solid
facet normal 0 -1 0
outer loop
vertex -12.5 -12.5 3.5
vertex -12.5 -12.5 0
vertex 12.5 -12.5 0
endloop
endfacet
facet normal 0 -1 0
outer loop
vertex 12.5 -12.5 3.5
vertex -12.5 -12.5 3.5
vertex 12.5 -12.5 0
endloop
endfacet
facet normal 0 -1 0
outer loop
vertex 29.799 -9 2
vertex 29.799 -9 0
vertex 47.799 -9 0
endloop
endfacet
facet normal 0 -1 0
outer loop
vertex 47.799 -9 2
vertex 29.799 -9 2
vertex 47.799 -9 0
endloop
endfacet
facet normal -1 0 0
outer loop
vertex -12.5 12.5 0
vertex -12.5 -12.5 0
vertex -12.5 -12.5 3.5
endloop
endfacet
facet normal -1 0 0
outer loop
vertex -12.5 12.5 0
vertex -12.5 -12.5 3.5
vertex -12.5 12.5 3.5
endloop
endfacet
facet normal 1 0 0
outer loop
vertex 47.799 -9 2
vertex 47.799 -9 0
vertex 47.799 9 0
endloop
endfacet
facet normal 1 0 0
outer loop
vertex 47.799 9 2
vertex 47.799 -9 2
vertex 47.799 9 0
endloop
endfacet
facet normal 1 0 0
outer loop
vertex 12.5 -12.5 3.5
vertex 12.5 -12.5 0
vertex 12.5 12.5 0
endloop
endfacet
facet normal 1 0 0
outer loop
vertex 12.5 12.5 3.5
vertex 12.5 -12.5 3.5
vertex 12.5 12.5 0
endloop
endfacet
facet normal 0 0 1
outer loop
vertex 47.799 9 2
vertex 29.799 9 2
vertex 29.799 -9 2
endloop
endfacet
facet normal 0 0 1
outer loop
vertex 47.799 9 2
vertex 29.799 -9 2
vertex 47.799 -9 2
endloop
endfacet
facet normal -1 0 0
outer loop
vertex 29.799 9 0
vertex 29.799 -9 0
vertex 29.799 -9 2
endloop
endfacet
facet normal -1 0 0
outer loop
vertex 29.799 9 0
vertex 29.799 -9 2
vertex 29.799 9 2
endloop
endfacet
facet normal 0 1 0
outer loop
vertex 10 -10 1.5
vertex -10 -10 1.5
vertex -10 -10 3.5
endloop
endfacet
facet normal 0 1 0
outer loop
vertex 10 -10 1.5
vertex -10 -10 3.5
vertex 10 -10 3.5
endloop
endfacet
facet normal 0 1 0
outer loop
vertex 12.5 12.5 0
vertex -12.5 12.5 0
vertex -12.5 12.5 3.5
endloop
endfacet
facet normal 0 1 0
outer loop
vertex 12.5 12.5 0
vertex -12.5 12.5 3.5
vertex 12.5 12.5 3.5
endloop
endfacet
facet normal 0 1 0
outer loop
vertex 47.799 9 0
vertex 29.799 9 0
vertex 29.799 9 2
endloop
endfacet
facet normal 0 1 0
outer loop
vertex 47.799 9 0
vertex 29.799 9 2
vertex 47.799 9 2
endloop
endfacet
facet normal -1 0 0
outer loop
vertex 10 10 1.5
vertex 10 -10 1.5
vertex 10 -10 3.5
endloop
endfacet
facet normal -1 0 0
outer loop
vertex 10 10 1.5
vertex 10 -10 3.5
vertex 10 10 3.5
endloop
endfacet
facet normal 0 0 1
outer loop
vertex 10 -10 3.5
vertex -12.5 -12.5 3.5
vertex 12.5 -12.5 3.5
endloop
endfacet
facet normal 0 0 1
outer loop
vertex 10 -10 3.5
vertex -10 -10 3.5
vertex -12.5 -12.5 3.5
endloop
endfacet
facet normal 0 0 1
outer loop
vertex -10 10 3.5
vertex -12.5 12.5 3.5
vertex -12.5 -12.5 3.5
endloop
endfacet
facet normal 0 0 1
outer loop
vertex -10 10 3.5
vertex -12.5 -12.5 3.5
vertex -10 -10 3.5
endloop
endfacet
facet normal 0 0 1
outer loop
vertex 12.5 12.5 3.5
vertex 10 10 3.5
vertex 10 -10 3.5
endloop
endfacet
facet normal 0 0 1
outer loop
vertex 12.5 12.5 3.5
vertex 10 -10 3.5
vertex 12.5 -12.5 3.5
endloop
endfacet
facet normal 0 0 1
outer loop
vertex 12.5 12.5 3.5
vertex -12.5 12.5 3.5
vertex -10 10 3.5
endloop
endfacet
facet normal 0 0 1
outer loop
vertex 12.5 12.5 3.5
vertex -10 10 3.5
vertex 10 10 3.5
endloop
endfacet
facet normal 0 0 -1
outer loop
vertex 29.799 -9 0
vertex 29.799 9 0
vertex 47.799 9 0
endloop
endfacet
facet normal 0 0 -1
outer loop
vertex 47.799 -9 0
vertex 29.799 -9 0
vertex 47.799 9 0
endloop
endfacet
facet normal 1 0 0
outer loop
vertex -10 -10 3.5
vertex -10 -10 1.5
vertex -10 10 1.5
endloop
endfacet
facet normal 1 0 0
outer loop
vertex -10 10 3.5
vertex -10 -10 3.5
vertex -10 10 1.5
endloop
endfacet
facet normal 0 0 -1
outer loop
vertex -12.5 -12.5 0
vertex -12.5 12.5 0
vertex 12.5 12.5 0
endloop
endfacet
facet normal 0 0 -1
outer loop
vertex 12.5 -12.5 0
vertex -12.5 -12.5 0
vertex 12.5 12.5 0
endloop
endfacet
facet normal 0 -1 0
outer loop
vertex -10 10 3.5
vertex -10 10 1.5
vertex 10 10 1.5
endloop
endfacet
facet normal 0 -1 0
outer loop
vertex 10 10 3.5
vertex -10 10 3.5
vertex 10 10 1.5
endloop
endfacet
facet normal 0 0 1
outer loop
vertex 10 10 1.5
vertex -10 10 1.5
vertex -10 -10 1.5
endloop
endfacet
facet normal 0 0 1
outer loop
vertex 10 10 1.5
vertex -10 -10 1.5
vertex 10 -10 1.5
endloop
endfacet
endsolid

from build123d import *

# Parameters (mm, degrees)
F0_W     = 25
F0_H     = 25
F0_W_2   = 20
F0_H_2   = 20
F1_DEPTH = 3.5
F0_W_3   = 18
F0_H_3   = 18
F2_DEPTH = 1.5
F3_DEPTH = 2


with BuildPart() as f1:
    # F0 (on Top) → F1 (new body)
    with BuildSketch(Plane.XY):
        Rectangle(F0_W, F0_H)
        Rectangle(F0_W_2, F0_H_2, mode=Mode.SUBTRACT)
    extrude(amount=F1_DEPTH)

    # F0 (on Top) → F2 (join)
    with BuildSketch(Plane.XY):
        Rectangle(F0_W_2, F0_H_2)
        Rectangle(F0_W_3, F0_H_3, mode=Mode.SUBTRACT)
        Rectangle(F0_W_3, F0_H_3)
    extrude(amount=F2_DEPTH)


with BuildPart() as f3:
    # F0 (on Top) → F3 (new body)
    with BuildSketch(Plane.XY):
        with Locations((38.799269, 0)):
            Rectangle(F0_W_3, F0_H_3)
    extrude(amount=F3_DEPTH)


solid = Compound([f1.part, f3.part])
